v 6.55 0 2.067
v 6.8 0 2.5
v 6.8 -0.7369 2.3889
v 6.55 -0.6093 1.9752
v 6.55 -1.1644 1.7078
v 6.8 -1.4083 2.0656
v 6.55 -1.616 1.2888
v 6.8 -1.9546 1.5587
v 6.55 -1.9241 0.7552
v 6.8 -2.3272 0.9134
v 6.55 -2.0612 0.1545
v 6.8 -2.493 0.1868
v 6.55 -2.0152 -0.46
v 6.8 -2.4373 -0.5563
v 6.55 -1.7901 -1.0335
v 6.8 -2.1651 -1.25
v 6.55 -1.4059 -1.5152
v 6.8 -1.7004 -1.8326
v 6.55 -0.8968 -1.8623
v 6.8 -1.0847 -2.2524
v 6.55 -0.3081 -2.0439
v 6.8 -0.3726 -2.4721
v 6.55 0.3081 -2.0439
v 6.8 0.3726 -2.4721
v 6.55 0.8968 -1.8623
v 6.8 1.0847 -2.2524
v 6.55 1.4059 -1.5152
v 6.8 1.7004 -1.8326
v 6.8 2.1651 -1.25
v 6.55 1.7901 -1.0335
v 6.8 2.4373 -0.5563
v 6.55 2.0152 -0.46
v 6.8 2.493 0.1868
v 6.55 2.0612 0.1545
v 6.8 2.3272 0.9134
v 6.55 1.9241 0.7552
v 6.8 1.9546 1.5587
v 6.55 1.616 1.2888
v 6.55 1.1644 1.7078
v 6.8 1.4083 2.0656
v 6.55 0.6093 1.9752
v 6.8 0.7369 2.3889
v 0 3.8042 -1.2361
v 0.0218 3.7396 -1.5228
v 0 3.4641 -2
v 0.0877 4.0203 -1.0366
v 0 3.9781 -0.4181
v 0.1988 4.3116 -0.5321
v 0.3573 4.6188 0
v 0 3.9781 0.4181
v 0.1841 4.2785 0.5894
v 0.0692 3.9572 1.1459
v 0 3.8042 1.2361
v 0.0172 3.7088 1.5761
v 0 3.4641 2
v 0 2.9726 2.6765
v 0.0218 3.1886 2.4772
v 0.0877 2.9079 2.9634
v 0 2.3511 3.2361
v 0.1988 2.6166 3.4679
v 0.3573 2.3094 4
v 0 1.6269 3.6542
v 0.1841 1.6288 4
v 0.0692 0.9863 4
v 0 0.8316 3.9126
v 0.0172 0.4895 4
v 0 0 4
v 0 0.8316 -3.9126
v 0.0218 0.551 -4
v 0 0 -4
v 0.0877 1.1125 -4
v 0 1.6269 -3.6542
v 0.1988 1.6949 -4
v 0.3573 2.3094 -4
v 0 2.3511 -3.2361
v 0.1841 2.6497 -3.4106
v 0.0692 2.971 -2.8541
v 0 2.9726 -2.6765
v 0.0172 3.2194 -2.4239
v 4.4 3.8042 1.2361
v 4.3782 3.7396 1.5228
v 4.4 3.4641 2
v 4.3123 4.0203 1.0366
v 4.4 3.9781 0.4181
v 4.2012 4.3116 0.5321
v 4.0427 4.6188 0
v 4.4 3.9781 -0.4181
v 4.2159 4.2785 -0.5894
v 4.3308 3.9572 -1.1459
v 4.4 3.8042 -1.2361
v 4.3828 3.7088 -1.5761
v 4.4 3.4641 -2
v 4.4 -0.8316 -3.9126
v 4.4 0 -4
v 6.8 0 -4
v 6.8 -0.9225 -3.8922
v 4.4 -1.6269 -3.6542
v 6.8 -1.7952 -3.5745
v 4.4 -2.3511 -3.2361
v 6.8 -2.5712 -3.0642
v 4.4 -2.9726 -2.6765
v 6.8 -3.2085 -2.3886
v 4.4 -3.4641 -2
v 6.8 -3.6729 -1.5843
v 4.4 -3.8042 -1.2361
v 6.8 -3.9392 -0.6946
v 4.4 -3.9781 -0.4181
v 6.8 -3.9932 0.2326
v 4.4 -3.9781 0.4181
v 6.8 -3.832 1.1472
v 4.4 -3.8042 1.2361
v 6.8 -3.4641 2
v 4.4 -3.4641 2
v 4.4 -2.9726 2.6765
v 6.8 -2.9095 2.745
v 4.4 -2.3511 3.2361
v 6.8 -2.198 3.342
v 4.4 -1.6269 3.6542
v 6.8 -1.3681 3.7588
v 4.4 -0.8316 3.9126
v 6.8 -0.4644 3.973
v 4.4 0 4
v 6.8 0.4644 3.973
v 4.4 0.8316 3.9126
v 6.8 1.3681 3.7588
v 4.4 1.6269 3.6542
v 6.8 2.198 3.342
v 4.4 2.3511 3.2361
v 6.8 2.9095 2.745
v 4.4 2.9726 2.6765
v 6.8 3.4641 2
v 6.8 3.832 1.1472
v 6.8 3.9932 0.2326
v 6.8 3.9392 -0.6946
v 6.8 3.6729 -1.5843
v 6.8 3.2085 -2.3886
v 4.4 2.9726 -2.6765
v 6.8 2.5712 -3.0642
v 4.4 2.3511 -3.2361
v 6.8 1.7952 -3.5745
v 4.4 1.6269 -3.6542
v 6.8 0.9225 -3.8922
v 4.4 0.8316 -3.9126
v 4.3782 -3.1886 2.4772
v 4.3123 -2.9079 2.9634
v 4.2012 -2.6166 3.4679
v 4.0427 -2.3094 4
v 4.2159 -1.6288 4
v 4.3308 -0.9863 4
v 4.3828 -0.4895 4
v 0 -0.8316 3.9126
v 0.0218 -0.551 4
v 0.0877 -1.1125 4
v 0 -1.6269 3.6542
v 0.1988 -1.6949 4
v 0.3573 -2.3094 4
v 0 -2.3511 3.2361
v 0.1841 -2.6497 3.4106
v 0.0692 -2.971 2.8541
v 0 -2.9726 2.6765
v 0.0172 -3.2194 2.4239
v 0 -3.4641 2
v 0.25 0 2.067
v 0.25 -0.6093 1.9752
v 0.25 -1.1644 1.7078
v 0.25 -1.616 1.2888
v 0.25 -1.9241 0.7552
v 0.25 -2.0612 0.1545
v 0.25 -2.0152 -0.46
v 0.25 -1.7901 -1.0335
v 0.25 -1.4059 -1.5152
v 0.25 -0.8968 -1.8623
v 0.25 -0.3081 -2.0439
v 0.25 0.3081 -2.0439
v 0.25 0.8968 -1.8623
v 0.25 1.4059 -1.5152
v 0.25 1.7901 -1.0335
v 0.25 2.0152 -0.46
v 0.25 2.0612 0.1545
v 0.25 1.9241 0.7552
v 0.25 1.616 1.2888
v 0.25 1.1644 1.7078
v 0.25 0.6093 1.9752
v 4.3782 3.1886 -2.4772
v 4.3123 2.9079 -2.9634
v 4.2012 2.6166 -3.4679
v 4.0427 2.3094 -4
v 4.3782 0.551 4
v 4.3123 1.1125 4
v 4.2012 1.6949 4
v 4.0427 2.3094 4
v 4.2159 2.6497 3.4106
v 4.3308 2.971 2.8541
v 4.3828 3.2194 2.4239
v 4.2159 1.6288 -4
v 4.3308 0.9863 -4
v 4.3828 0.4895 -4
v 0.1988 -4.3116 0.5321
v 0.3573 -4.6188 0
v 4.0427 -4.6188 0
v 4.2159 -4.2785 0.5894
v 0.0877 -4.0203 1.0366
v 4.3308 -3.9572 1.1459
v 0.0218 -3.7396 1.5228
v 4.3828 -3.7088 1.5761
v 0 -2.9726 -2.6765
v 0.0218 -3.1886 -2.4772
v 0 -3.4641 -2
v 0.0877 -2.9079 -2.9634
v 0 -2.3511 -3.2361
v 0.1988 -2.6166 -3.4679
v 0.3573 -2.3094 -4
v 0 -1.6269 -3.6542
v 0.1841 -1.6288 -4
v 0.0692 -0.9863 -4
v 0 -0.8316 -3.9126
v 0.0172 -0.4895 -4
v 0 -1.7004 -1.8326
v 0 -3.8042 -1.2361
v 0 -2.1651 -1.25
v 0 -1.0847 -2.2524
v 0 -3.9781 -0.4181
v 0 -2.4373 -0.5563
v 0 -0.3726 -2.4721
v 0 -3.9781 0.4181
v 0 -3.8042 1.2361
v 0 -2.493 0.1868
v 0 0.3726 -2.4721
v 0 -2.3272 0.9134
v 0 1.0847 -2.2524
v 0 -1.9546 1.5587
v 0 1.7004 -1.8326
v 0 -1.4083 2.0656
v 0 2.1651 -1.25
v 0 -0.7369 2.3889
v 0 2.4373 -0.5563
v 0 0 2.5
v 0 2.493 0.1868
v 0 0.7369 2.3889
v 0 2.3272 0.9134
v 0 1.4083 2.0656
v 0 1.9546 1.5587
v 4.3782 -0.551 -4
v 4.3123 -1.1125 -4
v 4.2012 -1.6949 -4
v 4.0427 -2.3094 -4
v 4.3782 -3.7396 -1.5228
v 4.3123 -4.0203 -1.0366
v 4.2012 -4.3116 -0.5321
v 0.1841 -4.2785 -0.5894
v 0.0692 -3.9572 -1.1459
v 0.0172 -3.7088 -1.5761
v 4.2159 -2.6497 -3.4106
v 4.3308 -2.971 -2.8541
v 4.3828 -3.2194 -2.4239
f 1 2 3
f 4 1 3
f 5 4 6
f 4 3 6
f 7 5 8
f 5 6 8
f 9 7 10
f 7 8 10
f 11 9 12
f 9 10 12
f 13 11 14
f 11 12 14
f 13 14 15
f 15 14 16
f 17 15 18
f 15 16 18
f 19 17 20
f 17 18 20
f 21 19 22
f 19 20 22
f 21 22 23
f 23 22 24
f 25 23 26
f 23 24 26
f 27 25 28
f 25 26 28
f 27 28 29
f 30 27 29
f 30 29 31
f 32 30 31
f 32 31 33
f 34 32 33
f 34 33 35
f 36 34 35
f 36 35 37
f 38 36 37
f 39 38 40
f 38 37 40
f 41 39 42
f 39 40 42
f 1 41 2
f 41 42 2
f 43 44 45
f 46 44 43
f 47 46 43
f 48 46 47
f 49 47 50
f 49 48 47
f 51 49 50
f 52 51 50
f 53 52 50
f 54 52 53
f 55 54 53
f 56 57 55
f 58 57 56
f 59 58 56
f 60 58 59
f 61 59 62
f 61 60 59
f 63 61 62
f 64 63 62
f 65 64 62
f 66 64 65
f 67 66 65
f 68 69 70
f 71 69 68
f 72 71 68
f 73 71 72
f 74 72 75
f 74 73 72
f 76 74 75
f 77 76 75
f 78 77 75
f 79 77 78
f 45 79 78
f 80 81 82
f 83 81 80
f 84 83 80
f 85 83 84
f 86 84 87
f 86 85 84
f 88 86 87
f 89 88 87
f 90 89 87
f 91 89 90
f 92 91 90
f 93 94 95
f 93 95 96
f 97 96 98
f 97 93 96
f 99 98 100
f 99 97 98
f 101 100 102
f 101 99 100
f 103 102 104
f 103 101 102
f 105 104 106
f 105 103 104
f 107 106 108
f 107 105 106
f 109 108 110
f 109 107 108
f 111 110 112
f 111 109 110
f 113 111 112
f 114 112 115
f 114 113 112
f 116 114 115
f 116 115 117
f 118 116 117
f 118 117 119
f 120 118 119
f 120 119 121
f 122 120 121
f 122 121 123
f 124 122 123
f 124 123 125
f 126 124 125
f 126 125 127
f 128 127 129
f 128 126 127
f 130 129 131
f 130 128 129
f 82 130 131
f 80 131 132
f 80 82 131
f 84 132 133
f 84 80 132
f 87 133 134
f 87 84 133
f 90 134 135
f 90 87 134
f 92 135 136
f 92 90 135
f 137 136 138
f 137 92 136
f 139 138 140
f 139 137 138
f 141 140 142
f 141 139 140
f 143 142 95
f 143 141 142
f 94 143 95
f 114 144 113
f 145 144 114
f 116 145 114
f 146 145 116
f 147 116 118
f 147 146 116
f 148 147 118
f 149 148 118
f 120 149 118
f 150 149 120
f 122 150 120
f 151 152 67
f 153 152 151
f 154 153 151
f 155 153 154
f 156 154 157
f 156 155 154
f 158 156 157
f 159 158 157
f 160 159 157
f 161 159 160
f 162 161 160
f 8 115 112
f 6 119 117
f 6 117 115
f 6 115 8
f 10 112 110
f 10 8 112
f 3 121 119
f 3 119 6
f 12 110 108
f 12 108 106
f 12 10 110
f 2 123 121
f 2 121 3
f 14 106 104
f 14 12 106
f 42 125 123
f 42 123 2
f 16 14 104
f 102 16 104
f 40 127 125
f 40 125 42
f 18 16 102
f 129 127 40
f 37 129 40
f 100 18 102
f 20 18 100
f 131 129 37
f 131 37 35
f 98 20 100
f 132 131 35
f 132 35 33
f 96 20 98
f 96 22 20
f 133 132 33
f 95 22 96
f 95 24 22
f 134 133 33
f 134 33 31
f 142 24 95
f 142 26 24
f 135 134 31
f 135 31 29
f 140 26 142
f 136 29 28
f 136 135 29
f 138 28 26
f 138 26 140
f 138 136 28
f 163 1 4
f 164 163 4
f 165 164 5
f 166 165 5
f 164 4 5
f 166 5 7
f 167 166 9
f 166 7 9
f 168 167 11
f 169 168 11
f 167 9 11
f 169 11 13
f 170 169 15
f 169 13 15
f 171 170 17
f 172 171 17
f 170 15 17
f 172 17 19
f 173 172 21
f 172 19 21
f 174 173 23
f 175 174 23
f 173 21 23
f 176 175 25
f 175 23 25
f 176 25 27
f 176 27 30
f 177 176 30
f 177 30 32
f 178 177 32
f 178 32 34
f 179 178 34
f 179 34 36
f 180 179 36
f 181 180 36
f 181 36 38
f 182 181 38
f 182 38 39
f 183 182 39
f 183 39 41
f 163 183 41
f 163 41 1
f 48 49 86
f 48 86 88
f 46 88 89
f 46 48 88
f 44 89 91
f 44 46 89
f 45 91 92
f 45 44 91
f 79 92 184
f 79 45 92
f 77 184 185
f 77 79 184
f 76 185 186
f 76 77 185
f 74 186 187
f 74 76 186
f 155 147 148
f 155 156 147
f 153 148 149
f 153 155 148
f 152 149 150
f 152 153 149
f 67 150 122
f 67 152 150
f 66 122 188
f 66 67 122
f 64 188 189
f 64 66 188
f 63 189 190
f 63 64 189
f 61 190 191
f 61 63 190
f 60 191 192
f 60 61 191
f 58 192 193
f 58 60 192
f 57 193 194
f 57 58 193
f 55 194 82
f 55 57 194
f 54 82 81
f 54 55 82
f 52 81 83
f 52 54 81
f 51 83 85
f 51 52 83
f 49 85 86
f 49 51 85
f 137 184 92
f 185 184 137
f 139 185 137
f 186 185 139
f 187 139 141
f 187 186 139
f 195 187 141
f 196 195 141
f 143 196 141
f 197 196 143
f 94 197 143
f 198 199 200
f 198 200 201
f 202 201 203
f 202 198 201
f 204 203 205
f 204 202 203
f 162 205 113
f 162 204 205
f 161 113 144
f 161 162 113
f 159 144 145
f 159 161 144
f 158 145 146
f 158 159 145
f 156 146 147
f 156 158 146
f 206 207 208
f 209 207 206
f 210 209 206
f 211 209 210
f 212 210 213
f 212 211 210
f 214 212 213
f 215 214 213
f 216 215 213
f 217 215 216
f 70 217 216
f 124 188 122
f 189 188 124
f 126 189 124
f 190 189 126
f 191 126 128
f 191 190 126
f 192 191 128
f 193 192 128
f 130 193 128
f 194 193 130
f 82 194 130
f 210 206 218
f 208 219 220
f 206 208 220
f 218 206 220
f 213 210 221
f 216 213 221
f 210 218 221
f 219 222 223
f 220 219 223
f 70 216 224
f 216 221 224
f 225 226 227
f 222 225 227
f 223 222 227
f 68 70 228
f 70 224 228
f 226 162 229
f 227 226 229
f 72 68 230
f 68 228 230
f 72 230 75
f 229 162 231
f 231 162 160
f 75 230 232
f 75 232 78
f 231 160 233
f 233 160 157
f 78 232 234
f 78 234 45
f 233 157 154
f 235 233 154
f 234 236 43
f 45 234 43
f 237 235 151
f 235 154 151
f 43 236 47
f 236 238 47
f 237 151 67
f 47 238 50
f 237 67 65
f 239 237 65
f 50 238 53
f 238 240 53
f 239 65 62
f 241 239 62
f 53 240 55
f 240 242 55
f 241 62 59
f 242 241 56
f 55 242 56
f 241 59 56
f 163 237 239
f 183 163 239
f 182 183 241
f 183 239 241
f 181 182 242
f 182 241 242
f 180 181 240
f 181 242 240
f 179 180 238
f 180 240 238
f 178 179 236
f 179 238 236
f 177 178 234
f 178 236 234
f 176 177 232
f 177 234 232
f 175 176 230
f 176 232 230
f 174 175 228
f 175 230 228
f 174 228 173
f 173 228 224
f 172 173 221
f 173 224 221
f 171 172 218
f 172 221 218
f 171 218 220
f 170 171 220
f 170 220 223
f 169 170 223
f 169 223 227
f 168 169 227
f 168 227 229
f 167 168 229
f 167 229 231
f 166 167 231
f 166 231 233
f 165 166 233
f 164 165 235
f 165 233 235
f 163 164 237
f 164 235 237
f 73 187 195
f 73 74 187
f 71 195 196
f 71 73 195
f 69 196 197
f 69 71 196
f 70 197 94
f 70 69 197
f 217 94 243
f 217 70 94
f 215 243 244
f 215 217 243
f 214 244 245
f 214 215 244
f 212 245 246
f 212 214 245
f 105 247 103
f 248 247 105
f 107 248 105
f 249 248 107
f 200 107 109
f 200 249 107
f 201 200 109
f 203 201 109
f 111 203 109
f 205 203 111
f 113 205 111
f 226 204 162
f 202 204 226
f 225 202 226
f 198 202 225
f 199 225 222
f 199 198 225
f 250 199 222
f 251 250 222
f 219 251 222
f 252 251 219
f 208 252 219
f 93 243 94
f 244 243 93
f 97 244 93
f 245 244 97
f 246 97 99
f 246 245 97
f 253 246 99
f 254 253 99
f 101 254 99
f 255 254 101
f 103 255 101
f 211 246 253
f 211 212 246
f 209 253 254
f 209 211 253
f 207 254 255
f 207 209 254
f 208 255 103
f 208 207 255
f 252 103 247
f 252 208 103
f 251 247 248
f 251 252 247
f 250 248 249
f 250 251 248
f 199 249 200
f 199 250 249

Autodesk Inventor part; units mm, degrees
ref_plane "YZ Plane" through (0, 0, 0) normal (1, 0, 0) x (0, 1, 0)
ref_plane "XZ Plane" through (0, 0, 0) normal (0, 1, 0) x (-1, 0, 0)
sketch "Sketch1" plane through (0, 0, 0) normal (1, 0, 0) x (0, 1, 0)
  line L0 (2.3094, -4) -> (-2.3094, -4)
  line L1 (-2.3094, -4) -> (-4.6188, 0)
  line L2 (-4.6188, 0) -> (-2.3094, 4)
  line L3 (-2.3094, 4) -> (2.3094, 4)
  line L4 (2.3094, 4) -> (4.6188, 0)
  line L5 (4.6188, 0) -> (2.3094, -4)
  point P0 (0, 0)
  point P1 (0, 0)
  dimension "d0" = 9.2376
extrude "Body" add sketch "Sketch1" along normal blind 4.4
sketch "Sketch2" plane through (4.4, 0, 0) normal (1, 0, 0) x (0, 0, -1)
  circle A0 centre (0, 0) radius 4
  dimension "d7" = 8
extrude "Ring" add sketch "Sketch2" along normal blind 2.4
sketch "Sketch3" plane through (0, 0, 0) normal (0, 0, 1) x (1, 0, 0)
  line L0 (0, 2.3094) -> (0, 4.6188) projected
  line L1 (0, 4.6188) -> (4.4, 4.6188) projected
  line L2 (4.4, 2.3094) -> (4.4, 4.6188) projected
  line L3 (-0.88, 0) -> (5.28, 0) projected
  line L4 (0, 4) -> (0.3573, 4.6188)
  line L5 (4.0427, 4.6188) -> (4.4, 4)
  dimension "d3" = 30
  dimension "d4" = 30
  dimension "d5" = 8
  dimension "d6" = 8
revolve "Chamfer1" cut sketch "Sketch3" angle 360 about axis through (-10, 0, 0) along (1, 0, 0)
sketch "Sketch4" plane through (0, 0, 0) normal (-1, 0, 0) x (0, 0, 1)
  line L0 (0, -6.4663) -> (0, 6.4663) projected
  line L1 (-5.6, 0) -> (5.6, 0) projected
  point P0 (0, 0)
hole "Thread" at (0, 0, 0) direction (1, 0, 0) diameter 4.134 end through all thread size "M5x0.8" class "6H" standard "ISO Metric profile"
chamfer "Chamfer2" distance 0.433 angle 30 1 edges at (0, 0, -2.067) measured on face at (0, -3.336, 0.083)
chamfer "Chamfer3" distance 0.433 angle 30 1 edges at (6.8, 0, -2.067) measured on face at (6.8, -0.484, -3.2969)
ref_plane "Work Plane1" through (13.9848, 0, 0) normal (0, 0, 1) x (-1, 0, 0)
equation "\"d0\" = 1.1547 * SW"
equation "\"d1\" = KOH1"
equation "\"d7\" = SD2"
equation "\"d8\" = KOH - KOH1"
equation "\"d3\" = ANG1"
equation "\"d4\" = ANG2"
equation "\"d5\" = SW0"
equation "\"d6\" = SW01"
equation "\"d10\" = -0.5 * GD1 + 0.5 * NND"
equation "\"d46\" = -0.5 * GD1 + 0.5 * NND"
equation "\"d12\" = -0.5 * GD1 + 0.5 * NND"
equation "\"d47\" = -0.5 * GD1 + 0.5 * NND"
equation "\"ANG1\" = 30deg"
equation "\"ANG2\" = 30deg"
equation "\"NND\" = 5"
equation "\"KOH1\" = 4.4"
equation "\"KOH\" = 6.8"
equation "\"SW\" = 8"
equation "\"SW0\" = SW"
equation "\"SW01\" = SW"
equation "\"SD2\" = SW"
equation "\"GUL\" = 0.541266 * PTC"
equation "\"THREADDIA\" = 5"
equation "\"TOA\" = 30deg"
equation "\"PTC\" = 0.8"
equation "\"E0\" = 1.155 * SW"
equation "\"GAL\" = 0.541266 * PTC"
equation "\"GD1\" = 4.133975"
properties part number "SS-ISO 7040 - M5" material "Steel, Mild"
